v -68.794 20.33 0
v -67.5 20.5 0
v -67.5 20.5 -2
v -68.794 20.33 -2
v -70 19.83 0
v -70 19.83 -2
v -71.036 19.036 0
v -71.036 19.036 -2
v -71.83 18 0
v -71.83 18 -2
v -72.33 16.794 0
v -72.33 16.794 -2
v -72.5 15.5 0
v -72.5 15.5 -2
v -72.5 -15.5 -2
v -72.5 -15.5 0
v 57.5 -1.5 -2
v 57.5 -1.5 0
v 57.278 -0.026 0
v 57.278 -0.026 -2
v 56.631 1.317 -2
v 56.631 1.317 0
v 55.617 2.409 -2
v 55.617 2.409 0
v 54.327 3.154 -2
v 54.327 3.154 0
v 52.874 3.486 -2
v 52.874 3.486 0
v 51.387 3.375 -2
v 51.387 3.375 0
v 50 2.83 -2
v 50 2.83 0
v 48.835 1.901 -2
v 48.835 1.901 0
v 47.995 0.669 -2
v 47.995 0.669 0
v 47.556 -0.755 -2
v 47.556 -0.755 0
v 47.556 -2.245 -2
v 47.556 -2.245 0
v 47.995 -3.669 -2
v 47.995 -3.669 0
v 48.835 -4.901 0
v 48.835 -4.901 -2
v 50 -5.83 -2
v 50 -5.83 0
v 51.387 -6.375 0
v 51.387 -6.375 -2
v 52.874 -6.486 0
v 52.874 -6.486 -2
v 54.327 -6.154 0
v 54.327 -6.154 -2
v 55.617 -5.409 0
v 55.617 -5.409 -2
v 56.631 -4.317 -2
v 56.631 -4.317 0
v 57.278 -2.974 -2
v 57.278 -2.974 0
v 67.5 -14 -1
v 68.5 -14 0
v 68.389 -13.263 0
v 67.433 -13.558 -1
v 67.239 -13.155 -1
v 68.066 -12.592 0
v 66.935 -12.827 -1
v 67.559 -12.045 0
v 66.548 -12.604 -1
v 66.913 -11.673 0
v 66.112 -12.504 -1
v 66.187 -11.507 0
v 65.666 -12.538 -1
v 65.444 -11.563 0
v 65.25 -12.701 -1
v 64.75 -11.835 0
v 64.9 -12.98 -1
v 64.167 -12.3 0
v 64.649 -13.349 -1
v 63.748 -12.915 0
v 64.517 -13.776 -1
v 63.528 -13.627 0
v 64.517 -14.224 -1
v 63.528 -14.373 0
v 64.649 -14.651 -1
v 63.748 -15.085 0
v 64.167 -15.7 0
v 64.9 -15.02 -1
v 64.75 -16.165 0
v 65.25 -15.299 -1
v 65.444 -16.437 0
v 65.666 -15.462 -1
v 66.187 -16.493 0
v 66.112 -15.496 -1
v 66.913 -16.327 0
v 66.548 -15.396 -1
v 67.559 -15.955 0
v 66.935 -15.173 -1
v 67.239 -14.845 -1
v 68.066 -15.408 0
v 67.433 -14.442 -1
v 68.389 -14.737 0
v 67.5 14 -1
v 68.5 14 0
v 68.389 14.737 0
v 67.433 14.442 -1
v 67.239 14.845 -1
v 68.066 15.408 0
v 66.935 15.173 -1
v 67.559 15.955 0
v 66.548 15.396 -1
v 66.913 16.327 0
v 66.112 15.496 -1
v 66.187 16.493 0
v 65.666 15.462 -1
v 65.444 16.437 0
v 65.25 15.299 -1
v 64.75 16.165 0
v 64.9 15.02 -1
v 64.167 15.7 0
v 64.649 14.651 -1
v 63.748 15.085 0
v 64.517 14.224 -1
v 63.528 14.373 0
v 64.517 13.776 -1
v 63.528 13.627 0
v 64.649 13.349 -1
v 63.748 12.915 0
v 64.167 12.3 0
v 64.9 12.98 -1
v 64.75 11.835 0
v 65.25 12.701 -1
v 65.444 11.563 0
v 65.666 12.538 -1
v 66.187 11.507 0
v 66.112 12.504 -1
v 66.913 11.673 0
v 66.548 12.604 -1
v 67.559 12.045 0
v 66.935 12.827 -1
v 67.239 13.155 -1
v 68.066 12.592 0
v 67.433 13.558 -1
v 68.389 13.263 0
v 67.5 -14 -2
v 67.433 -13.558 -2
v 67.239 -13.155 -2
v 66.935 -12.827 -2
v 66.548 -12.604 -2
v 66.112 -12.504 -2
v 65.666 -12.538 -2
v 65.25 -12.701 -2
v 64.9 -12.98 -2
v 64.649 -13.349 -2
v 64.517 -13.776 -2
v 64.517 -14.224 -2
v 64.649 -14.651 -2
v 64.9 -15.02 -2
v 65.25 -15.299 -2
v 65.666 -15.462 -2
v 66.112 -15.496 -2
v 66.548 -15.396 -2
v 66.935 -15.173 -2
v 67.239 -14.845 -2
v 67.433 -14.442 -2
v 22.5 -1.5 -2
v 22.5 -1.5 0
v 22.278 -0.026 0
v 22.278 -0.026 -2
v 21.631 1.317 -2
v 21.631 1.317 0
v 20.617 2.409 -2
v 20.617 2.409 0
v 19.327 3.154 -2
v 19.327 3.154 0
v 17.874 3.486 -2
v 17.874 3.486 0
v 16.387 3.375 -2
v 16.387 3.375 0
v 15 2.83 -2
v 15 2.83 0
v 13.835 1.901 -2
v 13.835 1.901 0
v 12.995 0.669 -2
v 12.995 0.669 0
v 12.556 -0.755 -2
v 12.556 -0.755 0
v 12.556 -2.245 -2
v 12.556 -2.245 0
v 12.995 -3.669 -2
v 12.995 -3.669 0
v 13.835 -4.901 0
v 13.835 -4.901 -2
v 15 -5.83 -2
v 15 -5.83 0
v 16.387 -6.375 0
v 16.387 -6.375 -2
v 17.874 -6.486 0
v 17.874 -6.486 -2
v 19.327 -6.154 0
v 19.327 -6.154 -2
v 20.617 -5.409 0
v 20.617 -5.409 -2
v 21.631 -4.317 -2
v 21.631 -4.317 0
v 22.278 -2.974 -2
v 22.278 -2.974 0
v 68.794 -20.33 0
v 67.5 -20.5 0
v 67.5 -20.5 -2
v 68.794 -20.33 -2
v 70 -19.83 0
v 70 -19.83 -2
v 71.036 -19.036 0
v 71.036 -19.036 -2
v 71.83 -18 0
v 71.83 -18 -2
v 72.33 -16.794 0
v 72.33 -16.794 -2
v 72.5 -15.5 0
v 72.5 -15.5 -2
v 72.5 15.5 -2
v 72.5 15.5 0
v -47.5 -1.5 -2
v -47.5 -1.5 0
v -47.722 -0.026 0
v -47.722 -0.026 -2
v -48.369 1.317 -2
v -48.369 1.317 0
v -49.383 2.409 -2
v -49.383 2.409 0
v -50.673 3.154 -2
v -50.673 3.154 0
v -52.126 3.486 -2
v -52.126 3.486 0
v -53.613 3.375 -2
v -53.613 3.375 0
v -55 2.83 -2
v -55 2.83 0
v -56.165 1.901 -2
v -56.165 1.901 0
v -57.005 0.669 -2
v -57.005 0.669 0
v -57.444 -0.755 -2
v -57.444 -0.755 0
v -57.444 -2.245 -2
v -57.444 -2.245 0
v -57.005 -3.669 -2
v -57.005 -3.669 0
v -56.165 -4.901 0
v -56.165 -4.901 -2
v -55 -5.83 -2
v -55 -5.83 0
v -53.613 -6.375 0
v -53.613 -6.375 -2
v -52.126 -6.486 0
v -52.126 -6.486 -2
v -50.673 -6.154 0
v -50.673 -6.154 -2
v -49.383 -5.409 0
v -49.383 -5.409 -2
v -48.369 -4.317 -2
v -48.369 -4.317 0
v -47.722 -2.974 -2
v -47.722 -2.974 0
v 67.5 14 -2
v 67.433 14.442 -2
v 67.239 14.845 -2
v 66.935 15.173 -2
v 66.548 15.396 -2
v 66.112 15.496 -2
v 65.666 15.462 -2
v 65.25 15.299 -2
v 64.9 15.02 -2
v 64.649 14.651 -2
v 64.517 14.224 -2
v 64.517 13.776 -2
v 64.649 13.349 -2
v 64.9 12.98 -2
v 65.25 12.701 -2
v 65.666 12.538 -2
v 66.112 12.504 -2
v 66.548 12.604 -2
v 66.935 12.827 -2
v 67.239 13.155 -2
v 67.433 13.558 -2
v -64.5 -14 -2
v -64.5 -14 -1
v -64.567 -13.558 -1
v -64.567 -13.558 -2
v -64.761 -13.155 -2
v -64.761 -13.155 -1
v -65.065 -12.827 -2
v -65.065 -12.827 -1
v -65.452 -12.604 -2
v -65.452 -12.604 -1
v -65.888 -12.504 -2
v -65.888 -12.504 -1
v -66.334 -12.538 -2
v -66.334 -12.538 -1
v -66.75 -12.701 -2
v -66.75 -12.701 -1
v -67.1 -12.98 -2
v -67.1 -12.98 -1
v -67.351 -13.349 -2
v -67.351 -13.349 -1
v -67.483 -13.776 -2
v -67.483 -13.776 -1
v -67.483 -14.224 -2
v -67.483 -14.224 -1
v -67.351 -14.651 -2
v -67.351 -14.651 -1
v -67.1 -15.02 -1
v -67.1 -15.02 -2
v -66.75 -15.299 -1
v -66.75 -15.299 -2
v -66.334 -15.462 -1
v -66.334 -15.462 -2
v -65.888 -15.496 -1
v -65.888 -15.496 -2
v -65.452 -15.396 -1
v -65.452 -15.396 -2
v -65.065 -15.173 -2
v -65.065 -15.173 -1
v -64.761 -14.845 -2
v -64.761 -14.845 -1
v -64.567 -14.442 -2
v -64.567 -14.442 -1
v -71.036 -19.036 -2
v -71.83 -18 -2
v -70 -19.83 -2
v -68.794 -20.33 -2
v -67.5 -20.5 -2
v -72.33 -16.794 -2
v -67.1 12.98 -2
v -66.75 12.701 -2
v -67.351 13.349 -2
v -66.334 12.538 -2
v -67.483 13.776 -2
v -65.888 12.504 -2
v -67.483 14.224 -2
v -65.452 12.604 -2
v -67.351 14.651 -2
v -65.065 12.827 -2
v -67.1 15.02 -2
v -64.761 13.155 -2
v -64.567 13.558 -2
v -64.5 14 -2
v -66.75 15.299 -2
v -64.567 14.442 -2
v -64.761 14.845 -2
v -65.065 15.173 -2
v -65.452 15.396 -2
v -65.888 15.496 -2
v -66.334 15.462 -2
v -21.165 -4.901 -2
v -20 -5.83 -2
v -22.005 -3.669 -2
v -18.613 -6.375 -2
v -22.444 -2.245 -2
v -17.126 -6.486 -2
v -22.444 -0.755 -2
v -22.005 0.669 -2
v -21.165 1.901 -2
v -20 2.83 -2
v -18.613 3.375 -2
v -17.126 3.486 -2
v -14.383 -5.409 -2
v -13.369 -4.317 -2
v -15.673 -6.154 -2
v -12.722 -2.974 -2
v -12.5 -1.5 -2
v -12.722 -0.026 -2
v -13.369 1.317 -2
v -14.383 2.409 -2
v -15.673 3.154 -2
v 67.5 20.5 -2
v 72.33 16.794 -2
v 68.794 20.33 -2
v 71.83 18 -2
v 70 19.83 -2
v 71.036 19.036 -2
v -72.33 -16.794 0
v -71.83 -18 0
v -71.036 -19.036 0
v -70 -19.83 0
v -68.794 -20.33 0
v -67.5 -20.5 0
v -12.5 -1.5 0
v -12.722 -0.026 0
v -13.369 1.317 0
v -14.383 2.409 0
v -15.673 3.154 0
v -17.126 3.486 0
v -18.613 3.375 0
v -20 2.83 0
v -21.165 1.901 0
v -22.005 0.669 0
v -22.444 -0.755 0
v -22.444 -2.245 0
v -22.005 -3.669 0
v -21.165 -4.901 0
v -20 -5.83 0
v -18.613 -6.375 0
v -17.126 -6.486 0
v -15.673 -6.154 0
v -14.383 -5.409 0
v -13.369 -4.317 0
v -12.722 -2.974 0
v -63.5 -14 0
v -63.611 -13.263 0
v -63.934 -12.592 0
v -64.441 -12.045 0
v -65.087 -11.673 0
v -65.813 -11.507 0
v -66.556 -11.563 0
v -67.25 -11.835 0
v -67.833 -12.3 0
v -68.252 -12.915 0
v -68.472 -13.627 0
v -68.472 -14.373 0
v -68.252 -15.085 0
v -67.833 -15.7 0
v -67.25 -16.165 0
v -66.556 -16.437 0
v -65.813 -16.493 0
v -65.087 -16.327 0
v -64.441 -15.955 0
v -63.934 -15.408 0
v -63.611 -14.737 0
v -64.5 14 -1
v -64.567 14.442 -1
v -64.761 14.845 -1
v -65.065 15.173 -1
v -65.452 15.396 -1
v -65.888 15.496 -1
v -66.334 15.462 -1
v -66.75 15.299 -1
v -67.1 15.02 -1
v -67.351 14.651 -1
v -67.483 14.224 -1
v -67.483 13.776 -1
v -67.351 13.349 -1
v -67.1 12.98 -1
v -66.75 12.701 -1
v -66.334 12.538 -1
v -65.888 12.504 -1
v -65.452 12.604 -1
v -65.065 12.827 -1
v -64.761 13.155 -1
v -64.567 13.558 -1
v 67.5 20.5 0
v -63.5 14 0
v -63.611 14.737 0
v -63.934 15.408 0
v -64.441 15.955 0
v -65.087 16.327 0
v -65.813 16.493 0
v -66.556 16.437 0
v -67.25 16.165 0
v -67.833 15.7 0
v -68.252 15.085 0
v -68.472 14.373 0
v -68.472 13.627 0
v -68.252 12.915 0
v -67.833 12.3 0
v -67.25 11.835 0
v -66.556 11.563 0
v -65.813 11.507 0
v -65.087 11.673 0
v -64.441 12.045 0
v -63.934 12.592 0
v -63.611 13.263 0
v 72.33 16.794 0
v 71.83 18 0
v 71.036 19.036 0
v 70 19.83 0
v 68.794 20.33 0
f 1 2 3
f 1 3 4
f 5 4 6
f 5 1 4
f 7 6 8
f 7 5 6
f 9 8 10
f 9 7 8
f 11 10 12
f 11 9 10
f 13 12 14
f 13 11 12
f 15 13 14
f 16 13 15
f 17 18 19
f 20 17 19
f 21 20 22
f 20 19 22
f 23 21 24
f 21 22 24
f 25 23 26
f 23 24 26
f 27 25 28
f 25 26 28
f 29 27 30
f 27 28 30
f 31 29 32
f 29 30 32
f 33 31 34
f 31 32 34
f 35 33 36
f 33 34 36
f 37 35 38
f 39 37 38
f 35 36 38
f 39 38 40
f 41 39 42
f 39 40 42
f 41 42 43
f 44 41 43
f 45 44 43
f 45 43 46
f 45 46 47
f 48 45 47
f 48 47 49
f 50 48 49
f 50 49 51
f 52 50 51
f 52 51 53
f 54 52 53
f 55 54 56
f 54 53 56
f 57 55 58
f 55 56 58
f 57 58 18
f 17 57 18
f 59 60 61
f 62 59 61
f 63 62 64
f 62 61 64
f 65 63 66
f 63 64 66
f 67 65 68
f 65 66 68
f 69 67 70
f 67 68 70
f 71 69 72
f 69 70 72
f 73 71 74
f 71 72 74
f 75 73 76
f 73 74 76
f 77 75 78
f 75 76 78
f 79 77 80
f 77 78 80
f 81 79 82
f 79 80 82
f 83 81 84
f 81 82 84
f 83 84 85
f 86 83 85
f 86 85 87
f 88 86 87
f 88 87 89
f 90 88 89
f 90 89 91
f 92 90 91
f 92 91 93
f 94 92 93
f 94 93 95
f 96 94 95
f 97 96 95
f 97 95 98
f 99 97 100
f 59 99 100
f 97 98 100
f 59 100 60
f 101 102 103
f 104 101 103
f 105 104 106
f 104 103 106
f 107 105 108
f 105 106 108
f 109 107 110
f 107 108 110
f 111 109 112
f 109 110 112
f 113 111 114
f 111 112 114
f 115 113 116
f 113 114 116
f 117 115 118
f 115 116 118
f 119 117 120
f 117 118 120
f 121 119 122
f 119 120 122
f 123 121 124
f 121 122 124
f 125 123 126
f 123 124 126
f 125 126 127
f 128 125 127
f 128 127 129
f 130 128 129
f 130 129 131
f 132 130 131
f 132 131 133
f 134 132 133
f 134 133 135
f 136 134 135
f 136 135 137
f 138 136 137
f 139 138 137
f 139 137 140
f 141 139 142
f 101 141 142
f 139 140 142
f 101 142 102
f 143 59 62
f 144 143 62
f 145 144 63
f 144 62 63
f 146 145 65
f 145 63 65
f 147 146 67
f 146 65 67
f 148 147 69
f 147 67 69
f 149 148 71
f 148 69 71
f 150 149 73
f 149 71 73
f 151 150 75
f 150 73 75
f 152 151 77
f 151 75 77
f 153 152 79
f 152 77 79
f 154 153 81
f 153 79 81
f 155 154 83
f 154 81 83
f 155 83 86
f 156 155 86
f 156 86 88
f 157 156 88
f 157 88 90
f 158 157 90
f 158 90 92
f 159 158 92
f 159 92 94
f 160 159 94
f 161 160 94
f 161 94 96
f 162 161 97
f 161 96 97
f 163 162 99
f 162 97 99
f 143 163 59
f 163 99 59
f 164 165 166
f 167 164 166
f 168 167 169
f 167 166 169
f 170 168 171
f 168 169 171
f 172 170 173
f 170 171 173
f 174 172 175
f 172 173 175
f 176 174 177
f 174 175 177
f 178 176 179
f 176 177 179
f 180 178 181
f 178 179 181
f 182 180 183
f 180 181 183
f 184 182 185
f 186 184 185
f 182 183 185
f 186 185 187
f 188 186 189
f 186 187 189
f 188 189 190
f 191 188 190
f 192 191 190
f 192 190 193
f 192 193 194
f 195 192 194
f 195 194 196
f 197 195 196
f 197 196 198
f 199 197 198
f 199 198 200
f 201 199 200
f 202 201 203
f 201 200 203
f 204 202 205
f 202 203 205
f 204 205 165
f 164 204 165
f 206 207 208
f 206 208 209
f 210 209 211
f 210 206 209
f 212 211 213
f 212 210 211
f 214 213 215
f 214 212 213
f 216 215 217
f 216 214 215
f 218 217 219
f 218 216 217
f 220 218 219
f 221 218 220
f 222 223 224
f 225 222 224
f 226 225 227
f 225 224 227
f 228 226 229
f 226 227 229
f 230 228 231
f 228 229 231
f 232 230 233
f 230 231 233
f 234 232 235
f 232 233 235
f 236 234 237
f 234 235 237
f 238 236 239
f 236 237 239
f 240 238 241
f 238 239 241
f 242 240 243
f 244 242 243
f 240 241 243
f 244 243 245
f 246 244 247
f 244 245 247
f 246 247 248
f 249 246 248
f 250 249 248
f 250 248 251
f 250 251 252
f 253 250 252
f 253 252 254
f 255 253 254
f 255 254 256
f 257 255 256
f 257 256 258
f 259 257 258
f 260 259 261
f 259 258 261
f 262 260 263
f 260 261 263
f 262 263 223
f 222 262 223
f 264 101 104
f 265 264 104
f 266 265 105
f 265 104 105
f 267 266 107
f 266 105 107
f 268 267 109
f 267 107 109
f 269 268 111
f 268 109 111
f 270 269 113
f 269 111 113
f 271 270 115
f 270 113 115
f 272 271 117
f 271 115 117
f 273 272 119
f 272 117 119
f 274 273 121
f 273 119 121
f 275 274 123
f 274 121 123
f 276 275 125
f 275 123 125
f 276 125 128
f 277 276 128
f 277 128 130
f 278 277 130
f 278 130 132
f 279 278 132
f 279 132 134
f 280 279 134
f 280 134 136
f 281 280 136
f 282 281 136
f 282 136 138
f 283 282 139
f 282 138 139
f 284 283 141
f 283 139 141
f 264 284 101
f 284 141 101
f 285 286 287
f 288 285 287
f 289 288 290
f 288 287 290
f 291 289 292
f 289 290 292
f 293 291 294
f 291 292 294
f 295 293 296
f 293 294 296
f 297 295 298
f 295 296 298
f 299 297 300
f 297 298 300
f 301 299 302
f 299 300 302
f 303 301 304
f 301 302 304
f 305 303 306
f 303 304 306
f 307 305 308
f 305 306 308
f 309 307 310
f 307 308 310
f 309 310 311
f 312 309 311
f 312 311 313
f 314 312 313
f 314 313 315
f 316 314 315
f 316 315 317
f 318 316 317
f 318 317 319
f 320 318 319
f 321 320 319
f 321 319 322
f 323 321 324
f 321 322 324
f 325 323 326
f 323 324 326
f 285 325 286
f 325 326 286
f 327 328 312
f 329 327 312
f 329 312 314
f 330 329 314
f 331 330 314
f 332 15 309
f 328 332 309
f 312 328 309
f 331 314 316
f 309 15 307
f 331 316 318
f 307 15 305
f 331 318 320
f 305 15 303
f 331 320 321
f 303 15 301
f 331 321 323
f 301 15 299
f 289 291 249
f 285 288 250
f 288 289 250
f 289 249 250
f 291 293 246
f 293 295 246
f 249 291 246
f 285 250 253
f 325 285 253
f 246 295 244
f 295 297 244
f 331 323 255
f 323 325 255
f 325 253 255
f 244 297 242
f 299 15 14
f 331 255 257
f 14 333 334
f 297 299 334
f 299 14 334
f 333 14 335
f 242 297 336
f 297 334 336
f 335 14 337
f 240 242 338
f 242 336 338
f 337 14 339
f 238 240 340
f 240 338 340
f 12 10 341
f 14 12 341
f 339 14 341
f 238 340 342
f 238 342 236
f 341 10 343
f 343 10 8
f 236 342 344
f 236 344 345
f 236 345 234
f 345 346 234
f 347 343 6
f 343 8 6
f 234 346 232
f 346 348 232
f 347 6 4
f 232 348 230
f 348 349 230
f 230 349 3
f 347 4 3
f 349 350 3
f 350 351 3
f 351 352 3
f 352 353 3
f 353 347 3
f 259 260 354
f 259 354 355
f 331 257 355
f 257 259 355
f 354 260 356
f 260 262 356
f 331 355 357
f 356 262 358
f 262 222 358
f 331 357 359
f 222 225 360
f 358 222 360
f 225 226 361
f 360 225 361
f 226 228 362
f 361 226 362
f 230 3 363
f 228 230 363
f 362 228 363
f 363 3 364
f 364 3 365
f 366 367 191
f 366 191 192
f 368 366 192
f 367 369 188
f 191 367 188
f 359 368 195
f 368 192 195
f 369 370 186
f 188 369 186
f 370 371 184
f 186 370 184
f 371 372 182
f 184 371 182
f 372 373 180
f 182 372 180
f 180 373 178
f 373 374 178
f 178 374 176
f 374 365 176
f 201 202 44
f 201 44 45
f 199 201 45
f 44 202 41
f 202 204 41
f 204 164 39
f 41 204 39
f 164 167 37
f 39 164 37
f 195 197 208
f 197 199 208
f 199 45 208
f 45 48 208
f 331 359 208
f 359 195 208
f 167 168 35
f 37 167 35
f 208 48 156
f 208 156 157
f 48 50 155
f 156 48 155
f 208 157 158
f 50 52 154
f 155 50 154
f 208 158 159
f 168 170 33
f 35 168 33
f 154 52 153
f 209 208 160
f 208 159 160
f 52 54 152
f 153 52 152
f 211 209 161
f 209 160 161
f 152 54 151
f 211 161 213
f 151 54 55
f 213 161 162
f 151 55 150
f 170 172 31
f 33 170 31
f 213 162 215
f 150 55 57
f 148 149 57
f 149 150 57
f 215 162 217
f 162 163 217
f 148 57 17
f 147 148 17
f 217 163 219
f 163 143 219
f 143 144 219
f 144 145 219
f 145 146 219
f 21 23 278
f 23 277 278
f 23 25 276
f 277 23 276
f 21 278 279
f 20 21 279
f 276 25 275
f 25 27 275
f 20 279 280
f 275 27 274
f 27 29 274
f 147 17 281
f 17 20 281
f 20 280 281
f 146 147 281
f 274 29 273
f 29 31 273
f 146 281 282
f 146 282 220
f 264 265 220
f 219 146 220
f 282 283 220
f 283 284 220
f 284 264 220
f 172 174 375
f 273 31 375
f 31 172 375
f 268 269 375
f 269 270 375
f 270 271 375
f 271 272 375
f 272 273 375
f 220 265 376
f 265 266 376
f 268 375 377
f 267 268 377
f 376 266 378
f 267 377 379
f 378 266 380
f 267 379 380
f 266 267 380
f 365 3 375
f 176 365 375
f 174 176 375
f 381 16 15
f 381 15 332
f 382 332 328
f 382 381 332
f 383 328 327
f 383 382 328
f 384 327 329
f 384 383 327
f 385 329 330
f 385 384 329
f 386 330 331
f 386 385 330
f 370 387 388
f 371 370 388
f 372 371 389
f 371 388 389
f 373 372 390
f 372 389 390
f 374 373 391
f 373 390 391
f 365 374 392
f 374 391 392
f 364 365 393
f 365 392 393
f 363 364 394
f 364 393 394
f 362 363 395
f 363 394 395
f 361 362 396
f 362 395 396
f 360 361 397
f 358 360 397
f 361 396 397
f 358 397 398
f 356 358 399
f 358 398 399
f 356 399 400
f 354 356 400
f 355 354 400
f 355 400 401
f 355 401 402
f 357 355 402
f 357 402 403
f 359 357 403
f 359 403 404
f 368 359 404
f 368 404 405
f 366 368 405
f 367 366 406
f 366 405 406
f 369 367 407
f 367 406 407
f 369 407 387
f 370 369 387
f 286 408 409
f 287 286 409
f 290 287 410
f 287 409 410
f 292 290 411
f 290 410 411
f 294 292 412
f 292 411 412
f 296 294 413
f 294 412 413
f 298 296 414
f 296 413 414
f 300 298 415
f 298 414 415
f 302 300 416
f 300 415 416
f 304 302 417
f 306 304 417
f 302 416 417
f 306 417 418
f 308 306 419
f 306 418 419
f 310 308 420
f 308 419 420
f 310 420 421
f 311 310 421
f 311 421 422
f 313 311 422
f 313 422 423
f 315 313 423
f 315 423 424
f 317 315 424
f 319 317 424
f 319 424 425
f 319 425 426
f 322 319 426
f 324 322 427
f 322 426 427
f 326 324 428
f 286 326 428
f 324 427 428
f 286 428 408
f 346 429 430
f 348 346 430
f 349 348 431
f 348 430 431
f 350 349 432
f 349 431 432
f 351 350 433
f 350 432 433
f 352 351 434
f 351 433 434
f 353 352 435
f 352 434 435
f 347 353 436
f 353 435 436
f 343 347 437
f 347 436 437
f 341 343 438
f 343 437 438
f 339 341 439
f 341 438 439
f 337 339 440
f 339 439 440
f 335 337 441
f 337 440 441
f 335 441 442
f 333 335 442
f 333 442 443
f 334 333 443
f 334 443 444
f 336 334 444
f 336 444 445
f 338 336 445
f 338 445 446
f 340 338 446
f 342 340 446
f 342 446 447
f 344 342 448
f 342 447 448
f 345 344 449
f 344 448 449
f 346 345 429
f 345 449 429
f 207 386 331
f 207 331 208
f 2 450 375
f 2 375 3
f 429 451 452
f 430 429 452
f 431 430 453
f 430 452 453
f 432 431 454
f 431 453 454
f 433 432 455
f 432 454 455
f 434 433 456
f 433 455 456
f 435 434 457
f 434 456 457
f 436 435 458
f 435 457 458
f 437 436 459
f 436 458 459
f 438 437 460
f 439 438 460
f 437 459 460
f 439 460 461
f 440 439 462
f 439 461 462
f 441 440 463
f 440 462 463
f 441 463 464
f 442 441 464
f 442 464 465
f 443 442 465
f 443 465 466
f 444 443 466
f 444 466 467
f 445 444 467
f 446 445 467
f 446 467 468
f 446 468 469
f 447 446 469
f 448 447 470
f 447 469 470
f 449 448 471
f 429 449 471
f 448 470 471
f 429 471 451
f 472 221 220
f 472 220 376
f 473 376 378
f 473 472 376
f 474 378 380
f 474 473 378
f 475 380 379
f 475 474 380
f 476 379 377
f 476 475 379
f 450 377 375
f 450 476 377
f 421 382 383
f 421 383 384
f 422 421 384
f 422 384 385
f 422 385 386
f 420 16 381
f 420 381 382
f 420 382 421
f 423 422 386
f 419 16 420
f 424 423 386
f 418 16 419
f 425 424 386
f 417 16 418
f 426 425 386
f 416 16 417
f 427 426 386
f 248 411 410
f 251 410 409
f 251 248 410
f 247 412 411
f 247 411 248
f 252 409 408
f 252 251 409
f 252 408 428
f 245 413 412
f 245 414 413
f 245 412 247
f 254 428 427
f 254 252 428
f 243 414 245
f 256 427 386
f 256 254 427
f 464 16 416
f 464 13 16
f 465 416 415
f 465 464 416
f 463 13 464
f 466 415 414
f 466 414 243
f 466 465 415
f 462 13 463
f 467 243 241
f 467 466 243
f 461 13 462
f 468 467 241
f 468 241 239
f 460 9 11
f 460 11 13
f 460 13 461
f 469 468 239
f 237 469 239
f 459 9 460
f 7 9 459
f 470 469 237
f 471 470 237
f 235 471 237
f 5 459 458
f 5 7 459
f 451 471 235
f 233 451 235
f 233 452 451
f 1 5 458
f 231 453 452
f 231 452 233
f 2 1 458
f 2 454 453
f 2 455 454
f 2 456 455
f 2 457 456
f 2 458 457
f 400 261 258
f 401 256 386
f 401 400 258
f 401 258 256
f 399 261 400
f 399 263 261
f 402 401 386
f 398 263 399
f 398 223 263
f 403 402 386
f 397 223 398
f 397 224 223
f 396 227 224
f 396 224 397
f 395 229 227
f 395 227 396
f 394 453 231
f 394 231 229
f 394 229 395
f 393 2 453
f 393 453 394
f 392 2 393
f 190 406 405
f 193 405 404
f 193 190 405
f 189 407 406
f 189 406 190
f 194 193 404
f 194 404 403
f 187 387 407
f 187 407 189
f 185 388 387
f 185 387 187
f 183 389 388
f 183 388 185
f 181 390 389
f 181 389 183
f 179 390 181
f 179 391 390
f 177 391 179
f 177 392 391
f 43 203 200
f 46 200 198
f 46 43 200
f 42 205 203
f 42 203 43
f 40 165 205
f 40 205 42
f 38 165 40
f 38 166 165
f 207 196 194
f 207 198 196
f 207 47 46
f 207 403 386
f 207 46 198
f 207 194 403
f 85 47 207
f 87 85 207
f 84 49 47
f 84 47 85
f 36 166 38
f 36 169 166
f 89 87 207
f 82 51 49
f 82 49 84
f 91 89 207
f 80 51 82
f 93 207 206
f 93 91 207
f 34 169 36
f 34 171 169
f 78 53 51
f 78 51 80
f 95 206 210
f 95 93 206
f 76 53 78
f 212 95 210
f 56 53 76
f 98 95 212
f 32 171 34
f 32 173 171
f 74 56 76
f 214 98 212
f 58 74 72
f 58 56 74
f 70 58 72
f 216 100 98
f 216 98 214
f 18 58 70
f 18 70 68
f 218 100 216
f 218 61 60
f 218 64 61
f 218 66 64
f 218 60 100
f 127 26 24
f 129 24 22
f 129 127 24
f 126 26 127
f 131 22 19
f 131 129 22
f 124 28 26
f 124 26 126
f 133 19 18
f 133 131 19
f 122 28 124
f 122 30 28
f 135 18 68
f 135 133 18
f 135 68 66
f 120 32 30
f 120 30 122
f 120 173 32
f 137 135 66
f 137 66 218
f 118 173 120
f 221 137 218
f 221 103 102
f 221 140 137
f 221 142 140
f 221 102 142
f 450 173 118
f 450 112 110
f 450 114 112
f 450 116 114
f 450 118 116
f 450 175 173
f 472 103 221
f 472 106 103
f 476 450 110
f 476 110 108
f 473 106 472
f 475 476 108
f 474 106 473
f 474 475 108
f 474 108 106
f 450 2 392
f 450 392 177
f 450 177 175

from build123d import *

# Parameters (mm, degrees)
CROQUIS1_R              = 5
CROQUIS1_R_2            = 1.5
SALIENTE_EXTRUIR1_DEPTH = 2
CHAFL_N1_SIZE           = 1


with BuildPart() as part:
    # Croquis1 → Saliente-Extruir1 (new body)
    with BuildSketch(Plane.XY):
        with BuildLine():
            Line((-67.5, -20.5), (67.5, -20.5))
            ThreePointArc((67.5, -20.5), (71.035533906, -19.035533906), (72.5, -15.5))
            Line((72.5, -15.5), (72.5, 15.5))
            ThreePointArc((72.5, 15.5), (71.035533906, 19.035533906), (67.5, 20.5))
            Line((67.5, 20.5), (-67.5, 20.5))
            ThreePointArc((-67.5, 20.5), (-71.035533906, 19.035533906), (-72.5, 15.5))
            Line((-72.5, 15.5), (-72.5, -15.5))
            ThreePointArc((-72.5, -15.5), (-71.035533906, -19.035533906), (-67.5, -20.5))
        make_face()
        with Locations((-52.5, -1.5)):
            Circle(CROQUIS1_R, mode=Mode.SUBTRACT)
        with Locations((-17.5, -1.5)):
            Circle(CROQUIS1_R, mode=Mode.SUBTRACT)
        with Locations((17.5, -1.5)):
            Circle(CROQUIS1_R, mode=Mode.SUBTRACT)
        with Locations((52.5, -1.5)):
            Circle(CROQUIS1_R, mode=Mode.SUBTRACT)
        with Locations((-66, 14)):
            Circle(CROQUIS1_R_2, mode=Mode.SUBTRACT)
        with Locations((-66, -14)):
            Circle(CROQUIS1_R_2, mode=Mode.SUBTRACT)
        with Locations((66, -14)):
            Circle(CROQUIS1_R_2, mode=Mode.SUBTRACT)
        with Locations((66, 14)):
            Circle(CROQUIS1_R_2, mode=Mode.SUBTRACT)
    extrude(amount=-SALIENTE_EXTRUIR1_DEPTH)

    # Chaflán1
    chafl_n1_edges = [part.edges().sort_by_distance(p)[0] for p in [
        (-67.5, 14, 0),
        (-67.5, -14, 0),
        (64.5, -14, 0),
        (64.5, 14, 0),
    ]]
    chamfer(chafl_n1_edges, length=CHAFL_N1_SIZE)


solid = part.part
